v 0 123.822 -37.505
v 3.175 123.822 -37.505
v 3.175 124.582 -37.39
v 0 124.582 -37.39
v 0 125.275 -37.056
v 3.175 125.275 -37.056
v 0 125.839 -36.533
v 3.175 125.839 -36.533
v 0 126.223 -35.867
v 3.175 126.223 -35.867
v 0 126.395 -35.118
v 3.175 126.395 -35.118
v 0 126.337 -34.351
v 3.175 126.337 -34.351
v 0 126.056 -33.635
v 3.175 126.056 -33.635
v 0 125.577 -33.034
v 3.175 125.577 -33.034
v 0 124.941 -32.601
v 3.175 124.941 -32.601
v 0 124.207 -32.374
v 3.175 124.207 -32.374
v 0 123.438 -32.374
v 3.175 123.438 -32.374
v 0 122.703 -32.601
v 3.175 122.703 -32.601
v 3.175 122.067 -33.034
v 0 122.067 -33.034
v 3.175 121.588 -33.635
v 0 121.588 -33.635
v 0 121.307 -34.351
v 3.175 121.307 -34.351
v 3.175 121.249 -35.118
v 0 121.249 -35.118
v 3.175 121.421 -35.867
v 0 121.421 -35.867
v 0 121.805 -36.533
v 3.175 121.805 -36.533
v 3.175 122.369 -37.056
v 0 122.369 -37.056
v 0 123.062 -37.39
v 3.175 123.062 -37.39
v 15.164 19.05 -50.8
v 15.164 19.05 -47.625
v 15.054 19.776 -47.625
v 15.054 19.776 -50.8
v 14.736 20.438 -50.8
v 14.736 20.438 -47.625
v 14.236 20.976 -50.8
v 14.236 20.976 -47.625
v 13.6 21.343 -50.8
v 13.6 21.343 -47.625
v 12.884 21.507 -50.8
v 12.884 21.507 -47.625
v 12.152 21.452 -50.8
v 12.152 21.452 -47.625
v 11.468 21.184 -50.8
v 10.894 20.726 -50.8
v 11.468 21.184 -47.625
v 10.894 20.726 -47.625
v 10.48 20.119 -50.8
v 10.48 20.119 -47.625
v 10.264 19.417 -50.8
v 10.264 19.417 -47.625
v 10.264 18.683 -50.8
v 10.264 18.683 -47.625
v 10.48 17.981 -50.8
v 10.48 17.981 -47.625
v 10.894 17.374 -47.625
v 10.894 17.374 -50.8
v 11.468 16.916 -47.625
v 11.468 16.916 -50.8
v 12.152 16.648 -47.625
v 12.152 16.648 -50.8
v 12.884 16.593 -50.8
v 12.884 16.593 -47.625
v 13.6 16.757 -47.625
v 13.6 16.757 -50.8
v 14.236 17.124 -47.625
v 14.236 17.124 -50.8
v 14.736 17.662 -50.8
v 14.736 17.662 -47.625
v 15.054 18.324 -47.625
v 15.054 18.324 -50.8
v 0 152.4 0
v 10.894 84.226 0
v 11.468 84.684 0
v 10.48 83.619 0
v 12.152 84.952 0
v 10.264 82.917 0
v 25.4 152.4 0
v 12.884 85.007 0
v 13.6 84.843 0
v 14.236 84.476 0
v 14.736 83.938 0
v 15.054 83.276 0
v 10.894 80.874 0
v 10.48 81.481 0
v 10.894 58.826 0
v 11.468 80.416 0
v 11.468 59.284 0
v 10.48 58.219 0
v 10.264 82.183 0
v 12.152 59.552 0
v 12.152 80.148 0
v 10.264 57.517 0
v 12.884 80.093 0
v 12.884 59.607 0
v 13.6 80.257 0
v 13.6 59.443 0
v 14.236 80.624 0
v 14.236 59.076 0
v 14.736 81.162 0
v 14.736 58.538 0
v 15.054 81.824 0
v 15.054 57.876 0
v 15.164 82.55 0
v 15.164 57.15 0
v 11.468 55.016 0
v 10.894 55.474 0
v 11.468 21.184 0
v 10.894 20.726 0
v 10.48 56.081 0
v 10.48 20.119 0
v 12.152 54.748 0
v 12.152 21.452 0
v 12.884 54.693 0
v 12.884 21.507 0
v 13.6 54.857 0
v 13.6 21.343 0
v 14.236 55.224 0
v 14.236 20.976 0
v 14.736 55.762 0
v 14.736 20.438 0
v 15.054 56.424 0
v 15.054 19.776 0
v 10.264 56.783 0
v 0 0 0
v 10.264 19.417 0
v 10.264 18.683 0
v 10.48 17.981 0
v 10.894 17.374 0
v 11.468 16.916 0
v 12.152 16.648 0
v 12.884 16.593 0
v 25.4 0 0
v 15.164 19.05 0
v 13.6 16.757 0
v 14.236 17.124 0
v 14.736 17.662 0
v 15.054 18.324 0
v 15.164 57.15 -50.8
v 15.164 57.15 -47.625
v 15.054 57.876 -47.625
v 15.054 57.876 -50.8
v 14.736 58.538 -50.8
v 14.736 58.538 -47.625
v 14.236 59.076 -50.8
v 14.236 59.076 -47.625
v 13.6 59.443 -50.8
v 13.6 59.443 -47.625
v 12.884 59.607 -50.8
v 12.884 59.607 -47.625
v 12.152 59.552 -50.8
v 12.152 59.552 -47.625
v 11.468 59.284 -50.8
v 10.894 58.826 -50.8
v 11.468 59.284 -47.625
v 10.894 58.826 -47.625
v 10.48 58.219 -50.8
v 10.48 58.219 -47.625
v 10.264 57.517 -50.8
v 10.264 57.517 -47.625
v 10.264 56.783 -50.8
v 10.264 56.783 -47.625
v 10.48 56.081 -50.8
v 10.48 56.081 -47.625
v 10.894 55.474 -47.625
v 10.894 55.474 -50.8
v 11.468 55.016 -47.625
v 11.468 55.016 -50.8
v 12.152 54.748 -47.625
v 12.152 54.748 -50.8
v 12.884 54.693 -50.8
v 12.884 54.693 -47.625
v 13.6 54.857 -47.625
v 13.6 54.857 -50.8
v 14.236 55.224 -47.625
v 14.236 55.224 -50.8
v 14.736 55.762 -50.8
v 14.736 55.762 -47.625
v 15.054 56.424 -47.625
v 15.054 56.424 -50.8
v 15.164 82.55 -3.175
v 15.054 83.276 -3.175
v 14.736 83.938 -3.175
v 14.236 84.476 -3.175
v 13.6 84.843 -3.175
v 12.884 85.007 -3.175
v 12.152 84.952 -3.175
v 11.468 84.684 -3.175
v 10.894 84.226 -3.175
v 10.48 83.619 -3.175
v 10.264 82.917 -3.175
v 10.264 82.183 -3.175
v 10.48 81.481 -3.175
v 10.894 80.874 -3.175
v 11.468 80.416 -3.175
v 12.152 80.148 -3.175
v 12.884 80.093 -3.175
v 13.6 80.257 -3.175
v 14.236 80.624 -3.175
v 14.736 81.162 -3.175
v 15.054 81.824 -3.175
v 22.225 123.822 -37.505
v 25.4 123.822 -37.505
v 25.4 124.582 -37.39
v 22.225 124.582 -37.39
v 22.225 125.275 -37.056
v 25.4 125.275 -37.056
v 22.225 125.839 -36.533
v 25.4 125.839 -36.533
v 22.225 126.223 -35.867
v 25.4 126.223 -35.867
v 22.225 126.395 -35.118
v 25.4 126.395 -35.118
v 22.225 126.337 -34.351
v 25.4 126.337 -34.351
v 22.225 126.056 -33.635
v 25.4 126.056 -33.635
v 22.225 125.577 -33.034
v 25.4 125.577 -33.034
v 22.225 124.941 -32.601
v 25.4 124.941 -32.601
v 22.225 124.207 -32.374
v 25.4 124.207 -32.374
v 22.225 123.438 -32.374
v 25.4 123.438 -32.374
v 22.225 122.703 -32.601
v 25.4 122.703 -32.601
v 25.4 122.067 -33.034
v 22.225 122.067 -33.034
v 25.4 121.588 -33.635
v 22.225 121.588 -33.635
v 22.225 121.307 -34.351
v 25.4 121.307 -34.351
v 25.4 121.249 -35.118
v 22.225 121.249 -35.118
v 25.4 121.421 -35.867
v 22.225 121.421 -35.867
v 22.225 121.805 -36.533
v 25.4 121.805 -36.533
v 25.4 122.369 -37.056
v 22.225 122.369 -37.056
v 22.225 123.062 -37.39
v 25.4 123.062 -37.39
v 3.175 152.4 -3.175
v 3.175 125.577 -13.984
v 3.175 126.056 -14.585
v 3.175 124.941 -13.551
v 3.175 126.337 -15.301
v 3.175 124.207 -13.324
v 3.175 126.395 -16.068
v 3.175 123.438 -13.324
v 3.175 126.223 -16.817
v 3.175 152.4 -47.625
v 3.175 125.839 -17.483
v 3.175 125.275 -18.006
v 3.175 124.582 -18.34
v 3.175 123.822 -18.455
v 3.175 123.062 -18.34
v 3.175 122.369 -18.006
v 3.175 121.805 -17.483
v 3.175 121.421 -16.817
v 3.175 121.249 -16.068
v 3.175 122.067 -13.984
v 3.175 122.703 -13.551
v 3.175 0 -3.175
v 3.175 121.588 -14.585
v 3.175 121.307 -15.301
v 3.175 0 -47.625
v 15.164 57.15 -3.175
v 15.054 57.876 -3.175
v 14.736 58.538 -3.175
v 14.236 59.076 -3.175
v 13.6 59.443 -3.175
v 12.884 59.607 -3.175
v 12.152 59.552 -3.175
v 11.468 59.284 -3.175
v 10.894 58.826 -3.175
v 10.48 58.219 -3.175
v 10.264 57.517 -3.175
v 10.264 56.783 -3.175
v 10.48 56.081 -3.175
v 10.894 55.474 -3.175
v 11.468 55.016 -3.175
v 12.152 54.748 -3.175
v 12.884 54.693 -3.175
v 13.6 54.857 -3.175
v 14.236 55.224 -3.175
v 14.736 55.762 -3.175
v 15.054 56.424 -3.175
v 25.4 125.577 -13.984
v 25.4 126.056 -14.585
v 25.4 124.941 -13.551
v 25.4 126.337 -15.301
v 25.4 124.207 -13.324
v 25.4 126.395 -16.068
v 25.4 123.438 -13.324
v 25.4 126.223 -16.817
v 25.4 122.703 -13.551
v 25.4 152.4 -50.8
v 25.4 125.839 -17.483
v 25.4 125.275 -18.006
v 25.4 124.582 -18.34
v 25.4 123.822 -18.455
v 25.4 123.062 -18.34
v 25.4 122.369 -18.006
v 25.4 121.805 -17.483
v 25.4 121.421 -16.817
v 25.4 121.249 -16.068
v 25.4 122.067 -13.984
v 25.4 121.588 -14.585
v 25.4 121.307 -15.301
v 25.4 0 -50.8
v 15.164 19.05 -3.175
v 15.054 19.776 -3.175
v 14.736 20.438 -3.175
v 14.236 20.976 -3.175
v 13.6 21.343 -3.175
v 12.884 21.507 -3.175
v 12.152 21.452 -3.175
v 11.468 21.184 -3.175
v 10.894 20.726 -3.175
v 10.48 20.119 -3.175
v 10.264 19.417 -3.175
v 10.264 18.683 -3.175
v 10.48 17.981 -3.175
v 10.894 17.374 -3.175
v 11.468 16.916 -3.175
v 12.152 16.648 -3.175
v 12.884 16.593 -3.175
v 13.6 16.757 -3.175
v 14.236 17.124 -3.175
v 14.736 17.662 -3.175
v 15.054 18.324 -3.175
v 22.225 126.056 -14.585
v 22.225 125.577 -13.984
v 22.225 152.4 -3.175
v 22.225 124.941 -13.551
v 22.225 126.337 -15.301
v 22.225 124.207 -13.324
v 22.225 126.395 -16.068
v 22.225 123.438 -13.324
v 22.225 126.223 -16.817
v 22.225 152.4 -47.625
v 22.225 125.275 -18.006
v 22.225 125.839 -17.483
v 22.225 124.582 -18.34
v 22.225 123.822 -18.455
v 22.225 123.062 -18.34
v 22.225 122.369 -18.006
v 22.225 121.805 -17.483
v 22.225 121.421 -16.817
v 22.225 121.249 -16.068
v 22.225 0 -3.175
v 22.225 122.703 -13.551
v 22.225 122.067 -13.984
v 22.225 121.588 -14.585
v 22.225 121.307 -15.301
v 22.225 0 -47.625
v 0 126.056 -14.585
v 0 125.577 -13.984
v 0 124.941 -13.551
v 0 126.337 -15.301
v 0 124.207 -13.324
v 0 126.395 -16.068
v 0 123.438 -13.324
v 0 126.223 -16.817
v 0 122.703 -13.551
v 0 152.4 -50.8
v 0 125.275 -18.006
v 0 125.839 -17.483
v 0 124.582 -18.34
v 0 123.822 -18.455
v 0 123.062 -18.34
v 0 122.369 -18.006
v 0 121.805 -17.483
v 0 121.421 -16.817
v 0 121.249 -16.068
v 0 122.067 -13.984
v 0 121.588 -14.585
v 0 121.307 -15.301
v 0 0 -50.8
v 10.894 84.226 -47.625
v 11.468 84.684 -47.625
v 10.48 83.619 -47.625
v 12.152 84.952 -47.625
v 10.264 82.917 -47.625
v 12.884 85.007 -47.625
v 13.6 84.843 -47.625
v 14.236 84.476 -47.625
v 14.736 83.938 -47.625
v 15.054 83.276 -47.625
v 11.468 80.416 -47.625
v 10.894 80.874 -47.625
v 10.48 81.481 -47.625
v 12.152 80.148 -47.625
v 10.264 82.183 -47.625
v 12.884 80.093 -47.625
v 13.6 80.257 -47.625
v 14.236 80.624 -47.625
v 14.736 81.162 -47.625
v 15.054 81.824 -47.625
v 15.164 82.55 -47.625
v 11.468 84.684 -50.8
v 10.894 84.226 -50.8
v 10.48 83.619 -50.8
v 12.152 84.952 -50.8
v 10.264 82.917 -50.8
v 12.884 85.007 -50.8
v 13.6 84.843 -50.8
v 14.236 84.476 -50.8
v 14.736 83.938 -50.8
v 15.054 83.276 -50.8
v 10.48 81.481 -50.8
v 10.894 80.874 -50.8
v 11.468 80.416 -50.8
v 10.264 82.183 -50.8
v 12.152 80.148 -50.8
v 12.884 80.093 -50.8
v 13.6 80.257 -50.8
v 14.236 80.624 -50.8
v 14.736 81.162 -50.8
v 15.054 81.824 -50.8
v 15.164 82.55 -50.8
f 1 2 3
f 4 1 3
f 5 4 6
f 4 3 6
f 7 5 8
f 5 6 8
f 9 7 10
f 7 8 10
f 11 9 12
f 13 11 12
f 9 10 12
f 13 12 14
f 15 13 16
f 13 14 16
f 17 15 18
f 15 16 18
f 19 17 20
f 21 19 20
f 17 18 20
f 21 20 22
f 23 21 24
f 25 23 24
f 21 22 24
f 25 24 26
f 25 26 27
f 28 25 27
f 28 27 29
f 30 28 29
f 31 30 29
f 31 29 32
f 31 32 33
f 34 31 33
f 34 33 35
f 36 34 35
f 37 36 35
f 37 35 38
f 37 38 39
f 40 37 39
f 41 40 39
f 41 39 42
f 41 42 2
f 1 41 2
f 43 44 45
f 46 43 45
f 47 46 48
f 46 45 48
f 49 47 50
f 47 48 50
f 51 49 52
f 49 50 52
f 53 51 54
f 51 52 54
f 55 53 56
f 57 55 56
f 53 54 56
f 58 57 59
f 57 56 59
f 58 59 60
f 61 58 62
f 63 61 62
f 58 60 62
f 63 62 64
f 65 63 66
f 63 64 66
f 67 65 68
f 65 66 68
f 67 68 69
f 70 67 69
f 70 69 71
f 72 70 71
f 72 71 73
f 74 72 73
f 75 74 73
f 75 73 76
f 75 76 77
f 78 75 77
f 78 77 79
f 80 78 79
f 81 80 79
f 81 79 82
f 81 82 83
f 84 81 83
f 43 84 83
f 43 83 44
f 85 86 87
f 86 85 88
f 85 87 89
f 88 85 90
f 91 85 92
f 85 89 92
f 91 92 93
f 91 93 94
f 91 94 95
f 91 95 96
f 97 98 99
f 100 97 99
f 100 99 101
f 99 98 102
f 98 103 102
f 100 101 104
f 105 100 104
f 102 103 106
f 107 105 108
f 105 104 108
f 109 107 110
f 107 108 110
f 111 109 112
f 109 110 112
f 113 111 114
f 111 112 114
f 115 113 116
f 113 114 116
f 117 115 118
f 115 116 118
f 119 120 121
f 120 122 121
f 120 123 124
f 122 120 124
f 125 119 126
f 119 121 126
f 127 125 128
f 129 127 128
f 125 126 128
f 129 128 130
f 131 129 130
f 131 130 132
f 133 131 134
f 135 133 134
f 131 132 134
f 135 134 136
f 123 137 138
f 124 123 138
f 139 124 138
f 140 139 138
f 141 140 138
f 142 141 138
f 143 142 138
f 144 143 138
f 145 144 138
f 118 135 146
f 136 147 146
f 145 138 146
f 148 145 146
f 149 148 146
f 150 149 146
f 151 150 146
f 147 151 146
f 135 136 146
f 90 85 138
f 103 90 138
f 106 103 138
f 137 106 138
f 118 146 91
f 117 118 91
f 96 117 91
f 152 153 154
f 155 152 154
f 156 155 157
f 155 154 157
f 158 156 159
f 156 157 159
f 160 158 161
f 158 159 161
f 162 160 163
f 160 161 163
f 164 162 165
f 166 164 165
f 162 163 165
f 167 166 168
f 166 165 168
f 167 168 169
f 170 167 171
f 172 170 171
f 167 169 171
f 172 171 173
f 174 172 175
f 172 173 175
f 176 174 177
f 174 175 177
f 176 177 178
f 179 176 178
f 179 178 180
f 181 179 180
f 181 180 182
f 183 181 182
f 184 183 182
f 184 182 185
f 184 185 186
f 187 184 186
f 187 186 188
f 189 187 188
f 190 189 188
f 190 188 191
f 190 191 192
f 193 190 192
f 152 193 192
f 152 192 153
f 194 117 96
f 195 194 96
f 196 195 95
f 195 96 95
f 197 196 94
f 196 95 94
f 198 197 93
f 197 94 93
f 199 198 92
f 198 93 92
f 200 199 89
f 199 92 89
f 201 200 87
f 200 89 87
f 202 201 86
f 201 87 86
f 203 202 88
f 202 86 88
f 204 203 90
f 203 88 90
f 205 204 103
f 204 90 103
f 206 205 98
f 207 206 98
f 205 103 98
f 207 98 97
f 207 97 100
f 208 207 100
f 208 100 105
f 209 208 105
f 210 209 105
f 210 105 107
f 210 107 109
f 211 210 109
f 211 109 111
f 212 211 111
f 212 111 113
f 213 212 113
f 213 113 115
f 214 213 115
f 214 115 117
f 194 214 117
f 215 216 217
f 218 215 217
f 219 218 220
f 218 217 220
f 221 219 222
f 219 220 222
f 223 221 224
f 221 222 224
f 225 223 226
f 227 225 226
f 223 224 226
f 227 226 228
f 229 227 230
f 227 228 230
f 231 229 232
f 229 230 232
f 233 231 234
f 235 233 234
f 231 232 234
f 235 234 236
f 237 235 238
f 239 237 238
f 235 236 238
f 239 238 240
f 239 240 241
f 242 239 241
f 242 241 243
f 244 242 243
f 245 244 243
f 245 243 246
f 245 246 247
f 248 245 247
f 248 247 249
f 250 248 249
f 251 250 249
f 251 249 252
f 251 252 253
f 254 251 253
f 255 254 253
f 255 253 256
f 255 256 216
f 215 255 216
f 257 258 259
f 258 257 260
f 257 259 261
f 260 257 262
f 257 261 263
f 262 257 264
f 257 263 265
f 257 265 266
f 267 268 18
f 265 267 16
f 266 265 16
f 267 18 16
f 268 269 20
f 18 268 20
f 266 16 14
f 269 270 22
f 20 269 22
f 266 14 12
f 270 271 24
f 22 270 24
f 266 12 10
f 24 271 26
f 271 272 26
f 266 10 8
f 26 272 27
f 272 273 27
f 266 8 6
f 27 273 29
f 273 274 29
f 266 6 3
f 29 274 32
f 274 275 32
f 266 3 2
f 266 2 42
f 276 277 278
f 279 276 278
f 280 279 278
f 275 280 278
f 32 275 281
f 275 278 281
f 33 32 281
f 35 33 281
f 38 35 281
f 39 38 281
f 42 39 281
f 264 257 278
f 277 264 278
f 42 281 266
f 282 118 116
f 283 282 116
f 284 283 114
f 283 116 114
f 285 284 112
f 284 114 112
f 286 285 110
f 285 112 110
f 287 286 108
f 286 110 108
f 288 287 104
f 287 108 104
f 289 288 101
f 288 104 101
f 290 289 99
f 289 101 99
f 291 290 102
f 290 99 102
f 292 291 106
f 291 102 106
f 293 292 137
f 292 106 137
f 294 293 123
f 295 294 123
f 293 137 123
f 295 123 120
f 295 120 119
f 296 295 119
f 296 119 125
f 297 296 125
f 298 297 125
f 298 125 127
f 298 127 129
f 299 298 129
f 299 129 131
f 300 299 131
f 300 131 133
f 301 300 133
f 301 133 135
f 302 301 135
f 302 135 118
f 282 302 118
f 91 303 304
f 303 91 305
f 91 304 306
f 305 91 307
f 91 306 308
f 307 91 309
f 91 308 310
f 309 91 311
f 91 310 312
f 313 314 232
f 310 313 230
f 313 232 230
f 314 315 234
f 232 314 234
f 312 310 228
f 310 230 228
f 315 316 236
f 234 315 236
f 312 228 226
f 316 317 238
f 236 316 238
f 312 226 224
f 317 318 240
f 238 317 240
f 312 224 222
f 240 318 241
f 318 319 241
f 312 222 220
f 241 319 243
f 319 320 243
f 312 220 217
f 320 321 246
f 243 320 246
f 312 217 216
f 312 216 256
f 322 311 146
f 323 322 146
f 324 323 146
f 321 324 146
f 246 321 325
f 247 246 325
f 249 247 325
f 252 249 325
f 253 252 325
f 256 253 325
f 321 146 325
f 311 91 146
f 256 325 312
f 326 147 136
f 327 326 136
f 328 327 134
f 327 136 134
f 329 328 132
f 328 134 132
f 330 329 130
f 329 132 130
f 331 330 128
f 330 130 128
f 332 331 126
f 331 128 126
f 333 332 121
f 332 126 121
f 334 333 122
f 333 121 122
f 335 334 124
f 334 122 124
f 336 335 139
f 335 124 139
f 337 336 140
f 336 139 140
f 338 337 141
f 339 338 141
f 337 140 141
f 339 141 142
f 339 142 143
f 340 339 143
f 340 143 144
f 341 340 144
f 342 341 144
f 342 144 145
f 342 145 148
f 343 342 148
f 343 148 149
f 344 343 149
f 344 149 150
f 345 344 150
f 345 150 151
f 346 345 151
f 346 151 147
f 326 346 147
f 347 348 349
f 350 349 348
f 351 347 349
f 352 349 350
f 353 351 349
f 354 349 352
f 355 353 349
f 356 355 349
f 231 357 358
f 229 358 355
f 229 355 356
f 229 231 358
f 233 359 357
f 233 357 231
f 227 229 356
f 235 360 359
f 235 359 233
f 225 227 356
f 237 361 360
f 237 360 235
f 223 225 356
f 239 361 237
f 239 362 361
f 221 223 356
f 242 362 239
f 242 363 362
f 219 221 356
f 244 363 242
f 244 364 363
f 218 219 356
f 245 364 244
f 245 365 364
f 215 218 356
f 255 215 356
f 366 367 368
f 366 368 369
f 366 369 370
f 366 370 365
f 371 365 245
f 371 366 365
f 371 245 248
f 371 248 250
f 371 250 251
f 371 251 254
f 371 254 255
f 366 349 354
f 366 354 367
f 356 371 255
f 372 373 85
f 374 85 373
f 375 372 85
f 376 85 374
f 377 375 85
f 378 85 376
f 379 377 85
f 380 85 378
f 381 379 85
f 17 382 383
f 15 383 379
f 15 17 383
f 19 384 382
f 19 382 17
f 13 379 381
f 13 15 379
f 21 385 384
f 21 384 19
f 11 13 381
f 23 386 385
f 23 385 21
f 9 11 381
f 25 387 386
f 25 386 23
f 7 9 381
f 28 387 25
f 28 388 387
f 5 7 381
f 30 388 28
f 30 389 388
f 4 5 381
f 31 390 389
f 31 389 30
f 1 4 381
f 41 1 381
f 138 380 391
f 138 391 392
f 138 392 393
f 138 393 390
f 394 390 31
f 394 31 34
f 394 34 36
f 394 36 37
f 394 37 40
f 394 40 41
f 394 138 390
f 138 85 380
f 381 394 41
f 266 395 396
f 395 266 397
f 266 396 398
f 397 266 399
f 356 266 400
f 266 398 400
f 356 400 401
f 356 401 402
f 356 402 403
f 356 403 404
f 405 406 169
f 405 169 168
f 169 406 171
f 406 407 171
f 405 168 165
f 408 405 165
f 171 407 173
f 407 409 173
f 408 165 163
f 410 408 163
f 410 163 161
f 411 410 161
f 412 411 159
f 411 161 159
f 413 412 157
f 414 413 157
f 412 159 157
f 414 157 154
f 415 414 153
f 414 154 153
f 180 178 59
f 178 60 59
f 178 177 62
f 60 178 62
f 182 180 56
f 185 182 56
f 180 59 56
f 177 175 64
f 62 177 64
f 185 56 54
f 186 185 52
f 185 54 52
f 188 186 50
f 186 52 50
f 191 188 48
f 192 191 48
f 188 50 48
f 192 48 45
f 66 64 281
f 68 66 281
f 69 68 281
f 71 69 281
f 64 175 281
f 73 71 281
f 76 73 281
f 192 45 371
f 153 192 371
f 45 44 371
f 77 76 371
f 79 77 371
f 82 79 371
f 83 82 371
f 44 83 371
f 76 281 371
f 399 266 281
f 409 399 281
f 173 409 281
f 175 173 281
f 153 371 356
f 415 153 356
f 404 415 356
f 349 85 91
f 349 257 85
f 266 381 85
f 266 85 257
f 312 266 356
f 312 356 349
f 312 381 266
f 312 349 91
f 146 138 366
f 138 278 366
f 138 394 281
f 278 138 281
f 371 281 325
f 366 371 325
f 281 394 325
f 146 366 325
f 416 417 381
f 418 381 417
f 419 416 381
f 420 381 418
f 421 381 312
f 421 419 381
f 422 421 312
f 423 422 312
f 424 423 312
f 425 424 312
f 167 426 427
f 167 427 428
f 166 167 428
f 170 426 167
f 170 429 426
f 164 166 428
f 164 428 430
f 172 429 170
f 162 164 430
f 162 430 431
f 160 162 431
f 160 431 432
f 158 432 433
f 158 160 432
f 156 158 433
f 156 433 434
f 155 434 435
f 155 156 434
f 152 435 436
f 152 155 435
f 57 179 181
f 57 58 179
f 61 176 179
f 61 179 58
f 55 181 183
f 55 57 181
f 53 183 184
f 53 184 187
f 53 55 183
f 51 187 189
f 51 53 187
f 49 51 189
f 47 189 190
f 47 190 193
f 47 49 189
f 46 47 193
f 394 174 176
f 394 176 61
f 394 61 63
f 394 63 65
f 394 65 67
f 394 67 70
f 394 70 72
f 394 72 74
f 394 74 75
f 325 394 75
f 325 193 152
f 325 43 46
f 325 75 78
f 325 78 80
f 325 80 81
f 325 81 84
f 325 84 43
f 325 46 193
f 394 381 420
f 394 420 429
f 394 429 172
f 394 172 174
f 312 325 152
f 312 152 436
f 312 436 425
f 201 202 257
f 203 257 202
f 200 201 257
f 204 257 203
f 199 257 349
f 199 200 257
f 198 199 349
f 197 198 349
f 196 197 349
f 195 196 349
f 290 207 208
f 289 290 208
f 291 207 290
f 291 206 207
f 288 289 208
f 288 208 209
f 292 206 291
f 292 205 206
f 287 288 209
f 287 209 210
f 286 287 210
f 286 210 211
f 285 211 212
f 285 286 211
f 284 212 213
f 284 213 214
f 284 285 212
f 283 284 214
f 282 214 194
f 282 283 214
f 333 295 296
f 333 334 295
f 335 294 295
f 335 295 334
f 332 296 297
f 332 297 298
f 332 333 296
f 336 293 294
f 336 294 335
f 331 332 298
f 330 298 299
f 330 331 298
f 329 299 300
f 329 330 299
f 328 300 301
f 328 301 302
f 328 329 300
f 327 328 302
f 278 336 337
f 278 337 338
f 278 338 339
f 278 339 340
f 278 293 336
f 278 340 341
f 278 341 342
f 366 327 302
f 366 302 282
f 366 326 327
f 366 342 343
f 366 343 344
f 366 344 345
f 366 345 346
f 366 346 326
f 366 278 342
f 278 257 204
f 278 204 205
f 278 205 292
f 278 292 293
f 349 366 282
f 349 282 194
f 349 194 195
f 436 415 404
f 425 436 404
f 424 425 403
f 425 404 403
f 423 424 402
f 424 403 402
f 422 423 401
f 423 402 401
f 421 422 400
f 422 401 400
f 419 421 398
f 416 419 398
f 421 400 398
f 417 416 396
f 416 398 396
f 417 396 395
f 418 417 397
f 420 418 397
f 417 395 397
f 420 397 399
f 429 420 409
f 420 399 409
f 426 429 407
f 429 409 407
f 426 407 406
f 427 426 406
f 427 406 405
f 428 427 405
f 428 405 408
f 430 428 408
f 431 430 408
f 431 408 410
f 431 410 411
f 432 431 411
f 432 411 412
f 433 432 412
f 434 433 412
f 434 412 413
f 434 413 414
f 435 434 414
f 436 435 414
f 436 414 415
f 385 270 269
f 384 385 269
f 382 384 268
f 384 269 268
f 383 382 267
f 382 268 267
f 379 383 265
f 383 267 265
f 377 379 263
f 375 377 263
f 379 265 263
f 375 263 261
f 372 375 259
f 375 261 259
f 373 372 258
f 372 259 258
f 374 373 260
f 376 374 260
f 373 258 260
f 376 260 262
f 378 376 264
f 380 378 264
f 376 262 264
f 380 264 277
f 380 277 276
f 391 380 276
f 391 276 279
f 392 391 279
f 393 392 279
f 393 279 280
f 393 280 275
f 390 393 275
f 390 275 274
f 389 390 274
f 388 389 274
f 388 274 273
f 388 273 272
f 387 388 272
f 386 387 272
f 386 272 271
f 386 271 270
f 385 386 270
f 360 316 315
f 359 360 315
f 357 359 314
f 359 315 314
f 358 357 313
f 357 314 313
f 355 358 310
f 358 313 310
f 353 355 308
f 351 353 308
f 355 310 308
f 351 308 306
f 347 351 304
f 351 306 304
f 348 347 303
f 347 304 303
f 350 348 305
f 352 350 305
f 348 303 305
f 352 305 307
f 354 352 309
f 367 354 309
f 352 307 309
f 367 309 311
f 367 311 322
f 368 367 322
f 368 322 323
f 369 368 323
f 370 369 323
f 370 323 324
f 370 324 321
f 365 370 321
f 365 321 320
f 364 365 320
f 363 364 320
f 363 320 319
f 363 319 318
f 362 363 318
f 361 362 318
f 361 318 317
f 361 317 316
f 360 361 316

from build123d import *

# Parameters (mm, degrees)
SKETCH1_W                        = 25.4
SKETCH1_H                        = 50.8
SKETCH1_W_2                      = 19.05
SKETCH1_H_2                      = 44.45
BOSS_EXTRUDE1_DEPTH              = 152.4
SKETCH2_R                        = 2.4638
CUT_EXTRUDE1_DEPTH               = 163.639355631
F_13_64_0_20313_DIAMETER_HOLE1_D = 5.159502


with BuildPart() as part:
    # Sketch1 → Boss-Extrude1 (new body)
    with BuildSketch(Plane(origin=(0, 0, 0), x_dir=(1, 0, 0), z_dir=(0, 1, 0))):
        with Locations((12.7, 25.4)):
            Rectangle(SKETCH1_W, SKETCH1_H)
        with Locations((12.7, 25.4)):
            Rectangle(SKETCH1_W_2, SKETCH1_H_2, mode=Mode.SUBTRACT)
    extrude(amount=BOSS_EXTRUDE1_DEPTH)

    # Sketch2 → Cut-Extrude1 (cut, through all)
    with BuildSketch(Plane.XY):
        with Locations((12.7, 82.55)):
            Circle(SKETCH2_R)
        with Locations((12.7, 57.15)):
            Circle(SKETCH2_R)
        with Locations((12.7, 19.05)):
            Circle(SKETCH2_R)
    extrude(amount=-CUT_EXTRUDE1_DEPTH, mode=Mode.SUBTRACT)

    # 13/64 (0.20313) Diameter Hole1 (through all)
    with Locations(Plane.ZY):
        with Locations((-34.925, 123.822021436), (-15.875, 123.822021436)):
            Hole(F_13_64_0_20313_DIAMETER_HOLE1_D / 2)


solid = part.part
